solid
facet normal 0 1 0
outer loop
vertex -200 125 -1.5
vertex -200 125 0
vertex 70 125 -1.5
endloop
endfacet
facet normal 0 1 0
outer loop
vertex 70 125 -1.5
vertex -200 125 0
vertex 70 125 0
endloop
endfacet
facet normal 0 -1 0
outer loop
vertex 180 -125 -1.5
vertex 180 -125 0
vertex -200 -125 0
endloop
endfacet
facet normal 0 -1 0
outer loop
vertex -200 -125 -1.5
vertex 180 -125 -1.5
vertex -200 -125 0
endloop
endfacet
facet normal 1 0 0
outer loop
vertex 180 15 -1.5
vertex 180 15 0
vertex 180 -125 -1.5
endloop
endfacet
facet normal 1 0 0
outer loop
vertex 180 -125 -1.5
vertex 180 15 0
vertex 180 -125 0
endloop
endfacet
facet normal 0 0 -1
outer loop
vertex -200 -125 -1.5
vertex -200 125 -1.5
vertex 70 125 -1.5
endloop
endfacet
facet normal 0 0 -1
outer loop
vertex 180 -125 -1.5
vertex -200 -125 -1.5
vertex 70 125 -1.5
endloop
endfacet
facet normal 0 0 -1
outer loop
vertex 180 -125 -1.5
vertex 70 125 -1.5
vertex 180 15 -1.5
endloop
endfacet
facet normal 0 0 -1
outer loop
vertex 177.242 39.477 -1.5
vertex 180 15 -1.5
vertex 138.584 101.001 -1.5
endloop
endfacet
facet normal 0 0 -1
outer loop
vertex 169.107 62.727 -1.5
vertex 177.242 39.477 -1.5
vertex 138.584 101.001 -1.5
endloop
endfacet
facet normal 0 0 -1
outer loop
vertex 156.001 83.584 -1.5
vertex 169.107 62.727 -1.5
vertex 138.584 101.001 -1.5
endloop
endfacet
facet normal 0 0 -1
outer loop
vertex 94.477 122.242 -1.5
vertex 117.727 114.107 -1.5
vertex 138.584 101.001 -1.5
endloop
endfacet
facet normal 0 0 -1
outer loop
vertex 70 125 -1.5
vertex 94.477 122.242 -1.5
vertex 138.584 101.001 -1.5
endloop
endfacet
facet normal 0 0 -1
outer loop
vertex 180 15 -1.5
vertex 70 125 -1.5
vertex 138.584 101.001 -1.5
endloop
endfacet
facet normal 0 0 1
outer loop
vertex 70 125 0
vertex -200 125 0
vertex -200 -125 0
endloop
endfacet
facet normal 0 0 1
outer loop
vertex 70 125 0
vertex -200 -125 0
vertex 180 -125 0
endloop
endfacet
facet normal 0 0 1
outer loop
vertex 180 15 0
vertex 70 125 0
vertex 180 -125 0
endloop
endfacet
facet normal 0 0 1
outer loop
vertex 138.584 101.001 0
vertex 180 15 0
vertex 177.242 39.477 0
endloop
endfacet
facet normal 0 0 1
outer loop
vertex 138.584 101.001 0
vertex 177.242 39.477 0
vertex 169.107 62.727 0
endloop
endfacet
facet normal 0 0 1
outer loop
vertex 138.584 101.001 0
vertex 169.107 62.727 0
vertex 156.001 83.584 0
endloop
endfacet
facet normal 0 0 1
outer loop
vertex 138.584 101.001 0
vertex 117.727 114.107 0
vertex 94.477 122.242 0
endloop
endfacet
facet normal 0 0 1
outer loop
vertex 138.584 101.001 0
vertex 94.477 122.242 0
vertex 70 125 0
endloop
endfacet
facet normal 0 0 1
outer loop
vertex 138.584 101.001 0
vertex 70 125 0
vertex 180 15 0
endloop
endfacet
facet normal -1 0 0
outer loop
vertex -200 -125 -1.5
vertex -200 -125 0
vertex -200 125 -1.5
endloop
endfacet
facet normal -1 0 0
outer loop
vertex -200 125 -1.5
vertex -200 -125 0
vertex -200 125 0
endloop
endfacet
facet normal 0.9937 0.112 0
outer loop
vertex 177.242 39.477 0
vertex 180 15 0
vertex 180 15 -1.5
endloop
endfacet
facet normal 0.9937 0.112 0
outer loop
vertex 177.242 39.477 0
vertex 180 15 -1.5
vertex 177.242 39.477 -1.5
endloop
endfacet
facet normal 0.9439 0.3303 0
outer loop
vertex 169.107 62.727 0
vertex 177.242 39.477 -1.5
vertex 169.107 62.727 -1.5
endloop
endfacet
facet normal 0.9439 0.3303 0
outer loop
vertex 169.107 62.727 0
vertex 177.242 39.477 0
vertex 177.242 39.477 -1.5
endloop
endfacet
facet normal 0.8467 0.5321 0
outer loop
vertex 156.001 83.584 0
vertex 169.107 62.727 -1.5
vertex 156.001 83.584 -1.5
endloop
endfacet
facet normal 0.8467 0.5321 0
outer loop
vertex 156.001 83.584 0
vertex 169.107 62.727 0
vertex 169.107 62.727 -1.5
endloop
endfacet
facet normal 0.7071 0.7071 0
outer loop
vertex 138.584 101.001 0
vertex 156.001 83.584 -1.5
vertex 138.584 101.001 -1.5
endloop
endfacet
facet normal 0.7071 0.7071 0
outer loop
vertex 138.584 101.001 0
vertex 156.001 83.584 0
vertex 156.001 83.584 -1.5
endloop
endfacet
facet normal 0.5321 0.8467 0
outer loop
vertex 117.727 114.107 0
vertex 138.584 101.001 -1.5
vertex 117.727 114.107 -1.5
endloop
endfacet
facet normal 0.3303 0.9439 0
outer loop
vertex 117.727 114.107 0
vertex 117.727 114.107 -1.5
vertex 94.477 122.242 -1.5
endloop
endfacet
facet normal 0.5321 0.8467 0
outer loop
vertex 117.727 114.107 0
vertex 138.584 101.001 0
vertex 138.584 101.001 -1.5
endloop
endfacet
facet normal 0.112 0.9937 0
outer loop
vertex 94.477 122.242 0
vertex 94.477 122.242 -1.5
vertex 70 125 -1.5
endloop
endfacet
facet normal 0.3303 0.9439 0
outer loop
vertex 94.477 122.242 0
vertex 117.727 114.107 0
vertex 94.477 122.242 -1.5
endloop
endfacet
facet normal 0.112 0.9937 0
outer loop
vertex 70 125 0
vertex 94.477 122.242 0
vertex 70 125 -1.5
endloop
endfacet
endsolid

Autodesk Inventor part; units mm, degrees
ref_plane "YZ Plane" through (0, 0, 0) normal (1, 0, 0) x (0, 1, 0)
ref_plane "XZ Plane" through (0, 0, 0) normal (0, 1, 0) x (-1, 0, 0)
ref_plane "Work Plane1" through (0, 0, 0) normal (0, 0, 1) x (1, 0, 0)
sketch "Sketch1" plane through (0, 0, 0) normal (0, 0, 1) x (1, 0, 0)
  line L0 (-200, 125) -> (70, 125)
  line L1 (-200, -125) -> (-200, 125)
  line L2 (180, -125) -> (-200, -125)
  line L3 (180, 15) -> (180, -125)
  arc A0 (180, 15) -> (70, 125) centre (70, 15) ccw
  point P0 (0, 0)
extrude "Plate1" add sketch "Sketch1" against normal blind 1.5
equation "\"d0\" = Thickness"
equation "\"BendRadius\" = Thickness"
equation "\"BendReliefWidth\" = Thickness"
equation "\"BendReliefDepth\" = 0.5 * Thickness"
equation "\"CornerReliefSize\" = 4 * Thickness"
equation "\"MinimumRemnant\" = 2 * Thickness"
equation "\"TransitionRadius\" = BendRadius"
equation "\"JacobiRadiusSize\" = BendRadius"
equation "\"GapSize\" = Thickness"
equation "\"Thickness\" = 1.5"
properties part number "CARCASA_ALUM_6"
